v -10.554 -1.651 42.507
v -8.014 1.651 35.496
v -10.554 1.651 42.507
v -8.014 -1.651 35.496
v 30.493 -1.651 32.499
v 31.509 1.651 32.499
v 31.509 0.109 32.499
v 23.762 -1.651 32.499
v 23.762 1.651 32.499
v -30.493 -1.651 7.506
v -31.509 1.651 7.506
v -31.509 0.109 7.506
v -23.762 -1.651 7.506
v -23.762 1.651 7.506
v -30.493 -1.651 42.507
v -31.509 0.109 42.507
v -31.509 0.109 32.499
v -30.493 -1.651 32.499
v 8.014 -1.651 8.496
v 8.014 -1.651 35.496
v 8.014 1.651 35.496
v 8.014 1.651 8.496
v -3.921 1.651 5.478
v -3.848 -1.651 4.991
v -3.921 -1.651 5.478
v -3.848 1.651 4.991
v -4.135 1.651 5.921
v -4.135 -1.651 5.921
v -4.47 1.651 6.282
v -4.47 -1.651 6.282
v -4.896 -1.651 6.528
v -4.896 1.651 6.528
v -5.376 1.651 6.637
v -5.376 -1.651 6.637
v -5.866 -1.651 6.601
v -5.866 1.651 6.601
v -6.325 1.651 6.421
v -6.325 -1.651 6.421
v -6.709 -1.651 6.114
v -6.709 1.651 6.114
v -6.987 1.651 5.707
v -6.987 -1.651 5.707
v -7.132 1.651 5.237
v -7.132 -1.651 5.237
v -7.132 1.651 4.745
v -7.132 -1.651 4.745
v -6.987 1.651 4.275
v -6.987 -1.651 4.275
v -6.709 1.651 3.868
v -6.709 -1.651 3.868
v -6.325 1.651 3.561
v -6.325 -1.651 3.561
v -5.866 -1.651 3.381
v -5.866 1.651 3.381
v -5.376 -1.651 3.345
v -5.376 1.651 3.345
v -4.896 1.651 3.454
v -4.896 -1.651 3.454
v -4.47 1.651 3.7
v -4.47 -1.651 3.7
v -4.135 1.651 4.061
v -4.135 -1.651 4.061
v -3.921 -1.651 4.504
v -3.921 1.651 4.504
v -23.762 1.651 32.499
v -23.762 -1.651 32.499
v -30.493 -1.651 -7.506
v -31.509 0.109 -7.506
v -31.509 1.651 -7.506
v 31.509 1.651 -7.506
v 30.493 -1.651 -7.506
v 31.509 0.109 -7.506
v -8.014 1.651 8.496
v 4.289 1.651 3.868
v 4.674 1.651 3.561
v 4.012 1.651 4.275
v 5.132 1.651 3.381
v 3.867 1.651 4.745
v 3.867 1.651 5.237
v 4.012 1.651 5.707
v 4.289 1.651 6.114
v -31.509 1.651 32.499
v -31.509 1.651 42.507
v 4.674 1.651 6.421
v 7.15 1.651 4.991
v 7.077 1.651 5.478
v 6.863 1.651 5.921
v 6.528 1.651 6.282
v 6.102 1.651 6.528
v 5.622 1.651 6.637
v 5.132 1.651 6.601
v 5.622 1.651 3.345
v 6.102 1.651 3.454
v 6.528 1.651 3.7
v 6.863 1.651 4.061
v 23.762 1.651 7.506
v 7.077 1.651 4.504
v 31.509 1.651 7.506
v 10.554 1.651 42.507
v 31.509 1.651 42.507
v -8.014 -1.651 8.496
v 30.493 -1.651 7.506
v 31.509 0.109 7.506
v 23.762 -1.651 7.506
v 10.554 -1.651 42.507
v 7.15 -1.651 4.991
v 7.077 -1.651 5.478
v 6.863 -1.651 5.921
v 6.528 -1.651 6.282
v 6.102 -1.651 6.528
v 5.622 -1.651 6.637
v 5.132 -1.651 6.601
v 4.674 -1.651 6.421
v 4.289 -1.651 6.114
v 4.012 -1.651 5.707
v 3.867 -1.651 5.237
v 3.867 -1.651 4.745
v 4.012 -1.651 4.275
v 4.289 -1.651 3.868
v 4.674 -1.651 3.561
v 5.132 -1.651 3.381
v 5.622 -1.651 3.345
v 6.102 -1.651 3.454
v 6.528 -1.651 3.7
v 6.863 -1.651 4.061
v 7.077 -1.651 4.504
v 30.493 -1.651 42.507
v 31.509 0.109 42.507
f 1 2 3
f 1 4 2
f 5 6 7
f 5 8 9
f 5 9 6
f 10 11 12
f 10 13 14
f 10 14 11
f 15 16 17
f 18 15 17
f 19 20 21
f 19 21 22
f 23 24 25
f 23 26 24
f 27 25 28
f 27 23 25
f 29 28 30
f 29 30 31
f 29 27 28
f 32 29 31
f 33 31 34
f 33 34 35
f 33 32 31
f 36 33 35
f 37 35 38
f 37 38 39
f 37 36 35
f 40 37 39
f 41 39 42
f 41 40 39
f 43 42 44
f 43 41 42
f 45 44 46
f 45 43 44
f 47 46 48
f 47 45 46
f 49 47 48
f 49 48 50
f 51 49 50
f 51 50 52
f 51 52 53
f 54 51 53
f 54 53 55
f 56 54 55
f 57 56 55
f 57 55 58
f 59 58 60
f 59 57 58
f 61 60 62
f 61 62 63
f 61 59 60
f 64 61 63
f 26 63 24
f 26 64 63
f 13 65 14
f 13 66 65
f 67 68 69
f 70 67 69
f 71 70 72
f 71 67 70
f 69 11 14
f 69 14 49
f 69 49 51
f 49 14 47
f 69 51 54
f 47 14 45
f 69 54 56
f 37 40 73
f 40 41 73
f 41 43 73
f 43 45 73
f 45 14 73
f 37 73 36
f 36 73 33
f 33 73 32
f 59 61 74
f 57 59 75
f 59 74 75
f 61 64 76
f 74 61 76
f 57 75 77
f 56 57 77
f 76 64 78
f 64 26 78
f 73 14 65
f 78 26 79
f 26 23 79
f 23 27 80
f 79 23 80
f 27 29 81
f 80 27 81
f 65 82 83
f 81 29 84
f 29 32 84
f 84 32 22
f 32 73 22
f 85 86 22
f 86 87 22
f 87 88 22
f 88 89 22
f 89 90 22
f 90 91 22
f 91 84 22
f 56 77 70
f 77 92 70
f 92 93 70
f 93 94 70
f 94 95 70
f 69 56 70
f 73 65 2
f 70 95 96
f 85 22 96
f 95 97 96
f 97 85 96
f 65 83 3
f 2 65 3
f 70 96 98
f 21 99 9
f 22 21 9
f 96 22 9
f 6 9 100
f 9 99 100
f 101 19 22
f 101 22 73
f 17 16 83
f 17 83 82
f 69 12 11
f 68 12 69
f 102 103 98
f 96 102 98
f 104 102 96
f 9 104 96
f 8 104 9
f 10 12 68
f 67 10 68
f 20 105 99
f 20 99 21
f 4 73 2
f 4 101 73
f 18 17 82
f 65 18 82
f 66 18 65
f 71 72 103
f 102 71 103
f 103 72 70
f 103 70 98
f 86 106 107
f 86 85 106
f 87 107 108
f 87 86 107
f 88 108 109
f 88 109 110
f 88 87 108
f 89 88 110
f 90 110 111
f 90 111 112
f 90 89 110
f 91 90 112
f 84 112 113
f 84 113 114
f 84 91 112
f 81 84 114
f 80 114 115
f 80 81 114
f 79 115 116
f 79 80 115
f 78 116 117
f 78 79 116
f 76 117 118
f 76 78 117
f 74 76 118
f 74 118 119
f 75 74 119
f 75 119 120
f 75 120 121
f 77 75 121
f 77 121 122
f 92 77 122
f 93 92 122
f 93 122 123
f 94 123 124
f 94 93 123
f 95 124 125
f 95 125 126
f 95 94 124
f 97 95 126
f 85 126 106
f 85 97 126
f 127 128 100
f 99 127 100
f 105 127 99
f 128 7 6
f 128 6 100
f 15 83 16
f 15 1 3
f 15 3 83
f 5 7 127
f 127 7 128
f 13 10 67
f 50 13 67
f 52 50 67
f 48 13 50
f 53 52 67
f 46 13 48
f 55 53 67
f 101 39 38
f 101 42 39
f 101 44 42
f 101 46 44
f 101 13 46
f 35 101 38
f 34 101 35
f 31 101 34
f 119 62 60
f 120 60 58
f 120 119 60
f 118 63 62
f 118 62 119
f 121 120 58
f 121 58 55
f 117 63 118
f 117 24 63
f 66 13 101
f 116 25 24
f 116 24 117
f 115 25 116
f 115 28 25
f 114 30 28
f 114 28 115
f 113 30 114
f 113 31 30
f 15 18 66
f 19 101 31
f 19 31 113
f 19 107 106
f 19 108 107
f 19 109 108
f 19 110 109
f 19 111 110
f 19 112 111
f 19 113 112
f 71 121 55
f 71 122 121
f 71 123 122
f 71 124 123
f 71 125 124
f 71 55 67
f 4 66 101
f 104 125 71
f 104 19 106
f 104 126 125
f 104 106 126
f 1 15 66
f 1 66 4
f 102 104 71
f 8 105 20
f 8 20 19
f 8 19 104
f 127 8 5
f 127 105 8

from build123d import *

# Parameters (mm, degrees)
F0_R     = 1.651
F1_DEPTH = 1.651
F2_SIZE2 = 1.7597636205
F2_SIZE  = 1.016


with BuildPart() as f1:
    # F0 (on Front) → F1 (new body, symmetric)
    with BuildSketch(Plane.XZ):
        Polygon((-31.5087, -7.5057), (31.5087, -7.5057), (31.5087, 7.5057), (23.7617, 7.5057), (23.7617, 32.4993), (31.5087, 32.4993), (31.5087, 42.5069), (23.7617, 42.5069), (10.5537, 42.5069), (8.0137, 35.4965), (8.0137, 8.4963), (0, 8.4963), (-8.0137, 8.4963), (-8.0137, 35.4965), (-10.5537, 42.5069), (-23.7617, 42.5069), (-31.5087, 42.5069), (-31.5087, 32.4993), (-23.7617, 32.4993), (-23.7617, 7.5057), (-31.5087, 7.5057), align=None)
        with Locations((-5.4991, 4.9910574029)):
            Circle(F0_R, mode=Mode.SUBTRACT)
        with Locations((5.4991, 4.9910574029)):
            Circle(F0_R, mode=Mode.SUBTRACT)
    extrude(amount=F1_DEPTH, both=True)

    # F2
    f2_edges = [f1.edges().sort_by_distance(p)[0] for p in [
        (31.5087, -1.651, 0),
        (31.5087, -1.651, 37.5031),
        (-31.5087, -1.651, 0),
        (-31.5087, -1.651, 37.5031),
    ]]
    f2_side = f1.faces().sort_by_distance((0, -1.651, -6.701184))[0]
    chamfer(f2_edges, length=F2_SIZE, length2=F2_SIZE2, reference=f2_side)


solid = f1.part
